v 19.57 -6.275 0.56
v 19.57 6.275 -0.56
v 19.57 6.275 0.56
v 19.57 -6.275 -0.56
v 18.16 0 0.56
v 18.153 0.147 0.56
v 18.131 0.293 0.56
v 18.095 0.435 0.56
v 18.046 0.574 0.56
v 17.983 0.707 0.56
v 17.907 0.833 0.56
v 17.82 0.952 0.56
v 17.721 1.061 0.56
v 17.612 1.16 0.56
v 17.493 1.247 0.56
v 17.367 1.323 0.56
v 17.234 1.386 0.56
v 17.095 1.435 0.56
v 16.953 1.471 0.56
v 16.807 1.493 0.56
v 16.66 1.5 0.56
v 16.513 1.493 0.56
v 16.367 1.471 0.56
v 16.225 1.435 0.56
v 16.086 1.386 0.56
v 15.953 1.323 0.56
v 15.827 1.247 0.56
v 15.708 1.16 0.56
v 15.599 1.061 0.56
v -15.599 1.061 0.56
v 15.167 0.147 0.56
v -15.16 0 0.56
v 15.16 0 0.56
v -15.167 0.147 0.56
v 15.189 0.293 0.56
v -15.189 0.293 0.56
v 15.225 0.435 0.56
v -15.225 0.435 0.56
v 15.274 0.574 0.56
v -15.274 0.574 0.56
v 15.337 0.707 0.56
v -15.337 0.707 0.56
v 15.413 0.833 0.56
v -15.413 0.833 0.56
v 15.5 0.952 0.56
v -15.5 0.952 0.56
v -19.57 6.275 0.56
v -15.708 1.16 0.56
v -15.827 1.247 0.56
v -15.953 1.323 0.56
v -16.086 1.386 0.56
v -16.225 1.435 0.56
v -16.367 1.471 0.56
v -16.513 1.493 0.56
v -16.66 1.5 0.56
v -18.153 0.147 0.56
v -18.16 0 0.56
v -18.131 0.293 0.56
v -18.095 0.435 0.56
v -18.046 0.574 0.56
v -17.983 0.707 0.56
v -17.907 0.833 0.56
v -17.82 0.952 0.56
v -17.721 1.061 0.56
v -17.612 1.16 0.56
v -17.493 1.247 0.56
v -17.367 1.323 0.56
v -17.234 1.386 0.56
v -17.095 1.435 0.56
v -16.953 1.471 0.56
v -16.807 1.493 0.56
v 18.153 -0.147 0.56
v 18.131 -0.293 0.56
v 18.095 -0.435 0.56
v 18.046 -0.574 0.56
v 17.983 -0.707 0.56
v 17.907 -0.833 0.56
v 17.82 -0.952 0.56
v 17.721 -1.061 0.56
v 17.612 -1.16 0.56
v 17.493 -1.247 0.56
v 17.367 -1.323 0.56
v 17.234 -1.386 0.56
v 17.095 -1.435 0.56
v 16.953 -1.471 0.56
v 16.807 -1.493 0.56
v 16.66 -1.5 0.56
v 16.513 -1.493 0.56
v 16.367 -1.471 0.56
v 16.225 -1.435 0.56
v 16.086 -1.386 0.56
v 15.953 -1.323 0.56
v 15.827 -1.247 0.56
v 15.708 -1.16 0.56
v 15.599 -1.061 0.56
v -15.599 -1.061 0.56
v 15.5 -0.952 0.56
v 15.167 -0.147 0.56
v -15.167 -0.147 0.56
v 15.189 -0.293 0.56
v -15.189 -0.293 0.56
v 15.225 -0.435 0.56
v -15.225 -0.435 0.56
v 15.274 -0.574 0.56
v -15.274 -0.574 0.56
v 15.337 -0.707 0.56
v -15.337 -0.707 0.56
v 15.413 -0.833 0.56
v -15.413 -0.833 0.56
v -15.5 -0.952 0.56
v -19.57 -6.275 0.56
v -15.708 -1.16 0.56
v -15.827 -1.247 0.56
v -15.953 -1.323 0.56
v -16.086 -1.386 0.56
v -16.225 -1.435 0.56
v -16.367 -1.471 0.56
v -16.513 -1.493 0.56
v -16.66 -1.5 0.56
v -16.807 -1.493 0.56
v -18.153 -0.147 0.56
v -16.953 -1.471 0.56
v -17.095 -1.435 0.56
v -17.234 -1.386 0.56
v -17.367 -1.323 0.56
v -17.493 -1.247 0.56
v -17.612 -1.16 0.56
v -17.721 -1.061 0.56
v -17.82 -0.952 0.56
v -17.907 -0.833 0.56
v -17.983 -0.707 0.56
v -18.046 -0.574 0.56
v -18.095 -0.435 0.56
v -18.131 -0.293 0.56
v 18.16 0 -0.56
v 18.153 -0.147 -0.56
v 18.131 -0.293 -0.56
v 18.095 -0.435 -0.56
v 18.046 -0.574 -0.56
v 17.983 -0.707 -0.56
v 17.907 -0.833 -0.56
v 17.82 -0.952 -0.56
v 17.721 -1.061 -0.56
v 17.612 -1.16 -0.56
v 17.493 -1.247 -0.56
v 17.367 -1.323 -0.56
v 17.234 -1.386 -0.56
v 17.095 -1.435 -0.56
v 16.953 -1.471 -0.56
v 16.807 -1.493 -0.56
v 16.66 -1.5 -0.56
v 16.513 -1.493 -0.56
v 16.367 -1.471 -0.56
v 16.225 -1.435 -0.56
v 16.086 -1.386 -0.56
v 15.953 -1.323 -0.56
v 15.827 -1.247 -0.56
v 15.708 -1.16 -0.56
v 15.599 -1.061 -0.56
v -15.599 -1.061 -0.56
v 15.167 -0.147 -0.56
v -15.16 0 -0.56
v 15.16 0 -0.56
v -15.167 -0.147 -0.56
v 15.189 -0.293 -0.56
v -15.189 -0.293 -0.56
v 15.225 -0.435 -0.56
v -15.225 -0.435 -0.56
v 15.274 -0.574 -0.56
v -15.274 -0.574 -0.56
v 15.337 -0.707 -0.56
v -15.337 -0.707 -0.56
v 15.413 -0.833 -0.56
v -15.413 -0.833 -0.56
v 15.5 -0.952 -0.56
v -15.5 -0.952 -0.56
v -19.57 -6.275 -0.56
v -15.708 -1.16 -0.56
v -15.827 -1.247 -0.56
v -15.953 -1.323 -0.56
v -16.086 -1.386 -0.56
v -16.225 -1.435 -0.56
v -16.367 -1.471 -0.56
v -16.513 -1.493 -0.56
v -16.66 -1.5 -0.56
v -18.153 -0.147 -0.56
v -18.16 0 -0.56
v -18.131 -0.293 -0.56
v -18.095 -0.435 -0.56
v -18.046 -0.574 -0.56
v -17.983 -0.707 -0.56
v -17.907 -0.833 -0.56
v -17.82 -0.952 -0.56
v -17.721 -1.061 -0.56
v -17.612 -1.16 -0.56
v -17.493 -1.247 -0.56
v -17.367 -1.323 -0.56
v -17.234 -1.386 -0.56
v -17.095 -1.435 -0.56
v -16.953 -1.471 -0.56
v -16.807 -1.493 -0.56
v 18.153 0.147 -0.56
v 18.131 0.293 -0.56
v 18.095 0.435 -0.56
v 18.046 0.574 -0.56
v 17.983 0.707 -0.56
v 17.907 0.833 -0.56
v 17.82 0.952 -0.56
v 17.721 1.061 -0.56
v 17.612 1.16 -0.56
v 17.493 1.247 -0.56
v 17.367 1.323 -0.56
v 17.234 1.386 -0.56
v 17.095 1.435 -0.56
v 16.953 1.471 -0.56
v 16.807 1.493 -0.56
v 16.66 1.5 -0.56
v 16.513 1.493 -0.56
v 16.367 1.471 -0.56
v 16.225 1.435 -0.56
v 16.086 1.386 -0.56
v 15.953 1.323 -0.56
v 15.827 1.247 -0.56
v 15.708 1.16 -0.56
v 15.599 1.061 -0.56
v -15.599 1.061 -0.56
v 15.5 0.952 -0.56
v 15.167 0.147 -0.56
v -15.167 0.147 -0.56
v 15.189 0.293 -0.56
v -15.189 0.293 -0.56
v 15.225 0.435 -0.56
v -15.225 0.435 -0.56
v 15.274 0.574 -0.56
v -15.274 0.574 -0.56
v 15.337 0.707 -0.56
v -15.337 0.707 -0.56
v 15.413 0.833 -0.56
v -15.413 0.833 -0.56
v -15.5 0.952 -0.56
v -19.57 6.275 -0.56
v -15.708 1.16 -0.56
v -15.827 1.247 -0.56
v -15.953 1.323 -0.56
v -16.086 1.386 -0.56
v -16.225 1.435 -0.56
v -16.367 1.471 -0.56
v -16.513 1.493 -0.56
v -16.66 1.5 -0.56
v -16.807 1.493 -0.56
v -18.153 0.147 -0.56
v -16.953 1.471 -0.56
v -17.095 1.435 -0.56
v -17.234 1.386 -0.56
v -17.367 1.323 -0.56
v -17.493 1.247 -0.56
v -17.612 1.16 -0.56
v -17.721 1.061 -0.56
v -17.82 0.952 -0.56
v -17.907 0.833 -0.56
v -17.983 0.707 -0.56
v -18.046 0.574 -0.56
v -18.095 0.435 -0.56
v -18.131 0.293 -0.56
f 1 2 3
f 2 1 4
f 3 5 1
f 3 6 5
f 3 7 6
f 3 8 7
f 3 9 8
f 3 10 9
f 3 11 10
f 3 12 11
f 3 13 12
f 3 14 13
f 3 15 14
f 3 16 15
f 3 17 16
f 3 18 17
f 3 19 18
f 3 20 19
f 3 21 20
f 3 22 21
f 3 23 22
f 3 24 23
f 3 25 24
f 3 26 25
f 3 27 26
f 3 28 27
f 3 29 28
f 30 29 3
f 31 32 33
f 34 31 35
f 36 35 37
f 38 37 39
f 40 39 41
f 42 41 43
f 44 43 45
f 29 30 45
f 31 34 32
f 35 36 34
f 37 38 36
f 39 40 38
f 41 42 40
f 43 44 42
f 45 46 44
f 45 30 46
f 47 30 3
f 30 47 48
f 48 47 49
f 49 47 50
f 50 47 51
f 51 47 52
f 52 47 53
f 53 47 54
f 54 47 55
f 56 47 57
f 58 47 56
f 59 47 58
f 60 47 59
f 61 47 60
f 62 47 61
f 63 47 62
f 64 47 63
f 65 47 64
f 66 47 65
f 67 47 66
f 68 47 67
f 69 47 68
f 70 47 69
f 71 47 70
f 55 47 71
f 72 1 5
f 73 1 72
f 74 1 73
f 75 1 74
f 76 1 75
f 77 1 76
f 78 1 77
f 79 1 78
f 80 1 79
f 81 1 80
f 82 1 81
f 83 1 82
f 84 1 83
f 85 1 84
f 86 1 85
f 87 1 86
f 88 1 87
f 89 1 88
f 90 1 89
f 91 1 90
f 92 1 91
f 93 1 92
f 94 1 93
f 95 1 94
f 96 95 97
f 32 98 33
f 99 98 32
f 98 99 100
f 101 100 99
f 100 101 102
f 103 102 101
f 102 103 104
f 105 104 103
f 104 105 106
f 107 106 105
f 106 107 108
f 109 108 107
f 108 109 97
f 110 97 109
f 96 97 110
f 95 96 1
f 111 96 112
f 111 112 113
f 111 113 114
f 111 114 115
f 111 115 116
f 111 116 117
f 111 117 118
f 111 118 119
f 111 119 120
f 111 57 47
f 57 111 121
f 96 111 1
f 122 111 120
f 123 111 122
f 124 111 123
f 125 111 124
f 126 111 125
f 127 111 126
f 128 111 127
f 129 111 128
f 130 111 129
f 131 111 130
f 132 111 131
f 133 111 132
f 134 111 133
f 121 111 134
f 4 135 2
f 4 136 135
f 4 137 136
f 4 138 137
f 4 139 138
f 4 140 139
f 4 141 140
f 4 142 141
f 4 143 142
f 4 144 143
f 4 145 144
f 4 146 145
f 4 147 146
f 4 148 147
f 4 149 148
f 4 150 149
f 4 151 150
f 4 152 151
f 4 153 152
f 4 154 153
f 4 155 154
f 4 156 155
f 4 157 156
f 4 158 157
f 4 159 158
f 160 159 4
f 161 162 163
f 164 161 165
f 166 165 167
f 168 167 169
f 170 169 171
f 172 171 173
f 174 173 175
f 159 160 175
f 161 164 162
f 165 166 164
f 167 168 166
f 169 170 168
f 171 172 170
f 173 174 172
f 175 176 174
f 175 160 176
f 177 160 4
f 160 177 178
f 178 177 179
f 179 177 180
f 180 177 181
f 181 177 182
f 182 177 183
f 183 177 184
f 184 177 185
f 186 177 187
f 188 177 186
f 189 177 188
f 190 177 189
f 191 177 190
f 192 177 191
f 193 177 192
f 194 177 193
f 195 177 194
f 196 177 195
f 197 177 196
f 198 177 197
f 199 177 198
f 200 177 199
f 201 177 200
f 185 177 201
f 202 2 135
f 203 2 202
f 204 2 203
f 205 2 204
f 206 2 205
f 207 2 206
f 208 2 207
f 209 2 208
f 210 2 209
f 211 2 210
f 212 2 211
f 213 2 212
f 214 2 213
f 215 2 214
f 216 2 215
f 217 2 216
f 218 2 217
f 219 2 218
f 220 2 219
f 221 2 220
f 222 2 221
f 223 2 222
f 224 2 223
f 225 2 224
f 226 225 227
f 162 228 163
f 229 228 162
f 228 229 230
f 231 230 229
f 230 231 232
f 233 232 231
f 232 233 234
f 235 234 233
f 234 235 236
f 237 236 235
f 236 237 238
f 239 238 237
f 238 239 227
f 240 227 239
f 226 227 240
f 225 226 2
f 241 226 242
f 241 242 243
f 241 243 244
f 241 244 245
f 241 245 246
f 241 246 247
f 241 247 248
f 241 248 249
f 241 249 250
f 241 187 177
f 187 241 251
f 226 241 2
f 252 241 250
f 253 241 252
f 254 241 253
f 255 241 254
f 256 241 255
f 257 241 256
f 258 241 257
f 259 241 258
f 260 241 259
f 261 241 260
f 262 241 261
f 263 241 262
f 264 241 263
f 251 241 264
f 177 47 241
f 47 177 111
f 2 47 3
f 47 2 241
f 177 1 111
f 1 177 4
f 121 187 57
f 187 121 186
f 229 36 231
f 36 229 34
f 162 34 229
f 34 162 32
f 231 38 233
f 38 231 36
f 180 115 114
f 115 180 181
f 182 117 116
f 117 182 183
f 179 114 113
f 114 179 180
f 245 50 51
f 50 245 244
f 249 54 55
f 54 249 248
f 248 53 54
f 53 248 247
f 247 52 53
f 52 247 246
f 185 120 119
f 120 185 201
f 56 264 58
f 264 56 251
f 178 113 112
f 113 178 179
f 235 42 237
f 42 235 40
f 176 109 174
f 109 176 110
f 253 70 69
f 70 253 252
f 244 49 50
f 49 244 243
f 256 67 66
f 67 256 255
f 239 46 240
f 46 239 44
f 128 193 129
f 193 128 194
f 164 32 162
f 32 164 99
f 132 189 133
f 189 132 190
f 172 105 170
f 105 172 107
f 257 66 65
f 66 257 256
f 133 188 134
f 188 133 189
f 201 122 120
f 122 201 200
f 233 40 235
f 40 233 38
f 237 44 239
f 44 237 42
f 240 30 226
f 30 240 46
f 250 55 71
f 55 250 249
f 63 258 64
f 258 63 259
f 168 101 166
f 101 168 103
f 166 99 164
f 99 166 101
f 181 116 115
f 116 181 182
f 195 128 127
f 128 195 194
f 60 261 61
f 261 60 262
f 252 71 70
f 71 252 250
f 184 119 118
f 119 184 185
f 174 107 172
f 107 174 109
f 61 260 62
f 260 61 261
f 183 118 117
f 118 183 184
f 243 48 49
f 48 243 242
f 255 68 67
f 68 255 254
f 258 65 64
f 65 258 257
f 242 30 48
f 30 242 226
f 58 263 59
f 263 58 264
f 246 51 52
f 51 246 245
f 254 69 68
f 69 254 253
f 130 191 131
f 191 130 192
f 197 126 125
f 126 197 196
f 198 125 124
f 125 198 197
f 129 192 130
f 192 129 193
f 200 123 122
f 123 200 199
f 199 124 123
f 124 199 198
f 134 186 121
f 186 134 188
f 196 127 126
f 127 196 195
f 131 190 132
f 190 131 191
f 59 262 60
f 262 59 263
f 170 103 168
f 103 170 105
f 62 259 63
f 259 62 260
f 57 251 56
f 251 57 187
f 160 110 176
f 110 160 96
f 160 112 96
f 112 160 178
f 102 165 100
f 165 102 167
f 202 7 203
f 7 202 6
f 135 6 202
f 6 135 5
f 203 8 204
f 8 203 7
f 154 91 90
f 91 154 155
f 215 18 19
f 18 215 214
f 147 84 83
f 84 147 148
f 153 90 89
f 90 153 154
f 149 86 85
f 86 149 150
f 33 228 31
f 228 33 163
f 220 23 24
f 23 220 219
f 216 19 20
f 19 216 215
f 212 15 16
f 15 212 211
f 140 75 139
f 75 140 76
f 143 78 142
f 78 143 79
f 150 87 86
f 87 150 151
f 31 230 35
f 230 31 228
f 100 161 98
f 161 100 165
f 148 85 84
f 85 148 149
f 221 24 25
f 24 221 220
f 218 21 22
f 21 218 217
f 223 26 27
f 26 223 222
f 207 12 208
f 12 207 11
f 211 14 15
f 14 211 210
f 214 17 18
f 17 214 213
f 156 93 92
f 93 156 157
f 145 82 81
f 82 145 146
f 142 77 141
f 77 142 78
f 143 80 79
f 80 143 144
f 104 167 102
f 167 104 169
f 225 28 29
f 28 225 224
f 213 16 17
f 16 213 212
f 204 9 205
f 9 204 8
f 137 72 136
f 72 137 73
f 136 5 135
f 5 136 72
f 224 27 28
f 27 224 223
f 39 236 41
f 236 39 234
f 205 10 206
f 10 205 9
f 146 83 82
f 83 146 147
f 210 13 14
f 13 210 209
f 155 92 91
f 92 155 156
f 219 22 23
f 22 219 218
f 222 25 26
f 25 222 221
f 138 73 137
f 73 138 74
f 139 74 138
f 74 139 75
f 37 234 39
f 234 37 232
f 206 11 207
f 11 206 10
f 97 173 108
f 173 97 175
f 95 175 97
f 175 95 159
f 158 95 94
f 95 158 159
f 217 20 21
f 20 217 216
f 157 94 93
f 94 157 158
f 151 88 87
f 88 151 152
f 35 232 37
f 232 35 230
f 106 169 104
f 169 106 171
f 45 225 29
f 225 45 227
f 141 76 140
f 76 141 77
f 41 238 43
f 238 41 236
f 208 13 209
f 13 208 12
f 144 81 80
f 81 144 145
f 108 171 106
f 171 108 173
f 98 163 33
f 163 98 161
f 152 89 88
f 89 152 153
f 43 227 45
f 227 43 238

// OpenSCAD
// Define the D-subminiature connector
module d_sub_connector() {
    // Flange dimensions
    flange_width = 39.14;
    flange_height = 12.55;
    flange_thickness = 1.12;
    
    // Mounting hole pitch
    hole_pitch = 33.32;
    hole_radius = 1.5; // Approximate size for mounting holes
    
    // Create the flange
    difference() {
        cube([flange_width, flange_height, flange_thickness], center = true);
        
        // Create mounting holes
        translate([-hole_pitch / 2, 0, 0])
            cylinder(h = flange_thickness + 1, r = hole_radius, center = true, $fn = 64);
        translate([hole_pitch / 2, 0, 0])
            cylinder(h = flange_thickness + 1, r = hole_radius, center = true, $fn = 64);
    }
}

// Call the module to render the connector
d_sub_connector();
